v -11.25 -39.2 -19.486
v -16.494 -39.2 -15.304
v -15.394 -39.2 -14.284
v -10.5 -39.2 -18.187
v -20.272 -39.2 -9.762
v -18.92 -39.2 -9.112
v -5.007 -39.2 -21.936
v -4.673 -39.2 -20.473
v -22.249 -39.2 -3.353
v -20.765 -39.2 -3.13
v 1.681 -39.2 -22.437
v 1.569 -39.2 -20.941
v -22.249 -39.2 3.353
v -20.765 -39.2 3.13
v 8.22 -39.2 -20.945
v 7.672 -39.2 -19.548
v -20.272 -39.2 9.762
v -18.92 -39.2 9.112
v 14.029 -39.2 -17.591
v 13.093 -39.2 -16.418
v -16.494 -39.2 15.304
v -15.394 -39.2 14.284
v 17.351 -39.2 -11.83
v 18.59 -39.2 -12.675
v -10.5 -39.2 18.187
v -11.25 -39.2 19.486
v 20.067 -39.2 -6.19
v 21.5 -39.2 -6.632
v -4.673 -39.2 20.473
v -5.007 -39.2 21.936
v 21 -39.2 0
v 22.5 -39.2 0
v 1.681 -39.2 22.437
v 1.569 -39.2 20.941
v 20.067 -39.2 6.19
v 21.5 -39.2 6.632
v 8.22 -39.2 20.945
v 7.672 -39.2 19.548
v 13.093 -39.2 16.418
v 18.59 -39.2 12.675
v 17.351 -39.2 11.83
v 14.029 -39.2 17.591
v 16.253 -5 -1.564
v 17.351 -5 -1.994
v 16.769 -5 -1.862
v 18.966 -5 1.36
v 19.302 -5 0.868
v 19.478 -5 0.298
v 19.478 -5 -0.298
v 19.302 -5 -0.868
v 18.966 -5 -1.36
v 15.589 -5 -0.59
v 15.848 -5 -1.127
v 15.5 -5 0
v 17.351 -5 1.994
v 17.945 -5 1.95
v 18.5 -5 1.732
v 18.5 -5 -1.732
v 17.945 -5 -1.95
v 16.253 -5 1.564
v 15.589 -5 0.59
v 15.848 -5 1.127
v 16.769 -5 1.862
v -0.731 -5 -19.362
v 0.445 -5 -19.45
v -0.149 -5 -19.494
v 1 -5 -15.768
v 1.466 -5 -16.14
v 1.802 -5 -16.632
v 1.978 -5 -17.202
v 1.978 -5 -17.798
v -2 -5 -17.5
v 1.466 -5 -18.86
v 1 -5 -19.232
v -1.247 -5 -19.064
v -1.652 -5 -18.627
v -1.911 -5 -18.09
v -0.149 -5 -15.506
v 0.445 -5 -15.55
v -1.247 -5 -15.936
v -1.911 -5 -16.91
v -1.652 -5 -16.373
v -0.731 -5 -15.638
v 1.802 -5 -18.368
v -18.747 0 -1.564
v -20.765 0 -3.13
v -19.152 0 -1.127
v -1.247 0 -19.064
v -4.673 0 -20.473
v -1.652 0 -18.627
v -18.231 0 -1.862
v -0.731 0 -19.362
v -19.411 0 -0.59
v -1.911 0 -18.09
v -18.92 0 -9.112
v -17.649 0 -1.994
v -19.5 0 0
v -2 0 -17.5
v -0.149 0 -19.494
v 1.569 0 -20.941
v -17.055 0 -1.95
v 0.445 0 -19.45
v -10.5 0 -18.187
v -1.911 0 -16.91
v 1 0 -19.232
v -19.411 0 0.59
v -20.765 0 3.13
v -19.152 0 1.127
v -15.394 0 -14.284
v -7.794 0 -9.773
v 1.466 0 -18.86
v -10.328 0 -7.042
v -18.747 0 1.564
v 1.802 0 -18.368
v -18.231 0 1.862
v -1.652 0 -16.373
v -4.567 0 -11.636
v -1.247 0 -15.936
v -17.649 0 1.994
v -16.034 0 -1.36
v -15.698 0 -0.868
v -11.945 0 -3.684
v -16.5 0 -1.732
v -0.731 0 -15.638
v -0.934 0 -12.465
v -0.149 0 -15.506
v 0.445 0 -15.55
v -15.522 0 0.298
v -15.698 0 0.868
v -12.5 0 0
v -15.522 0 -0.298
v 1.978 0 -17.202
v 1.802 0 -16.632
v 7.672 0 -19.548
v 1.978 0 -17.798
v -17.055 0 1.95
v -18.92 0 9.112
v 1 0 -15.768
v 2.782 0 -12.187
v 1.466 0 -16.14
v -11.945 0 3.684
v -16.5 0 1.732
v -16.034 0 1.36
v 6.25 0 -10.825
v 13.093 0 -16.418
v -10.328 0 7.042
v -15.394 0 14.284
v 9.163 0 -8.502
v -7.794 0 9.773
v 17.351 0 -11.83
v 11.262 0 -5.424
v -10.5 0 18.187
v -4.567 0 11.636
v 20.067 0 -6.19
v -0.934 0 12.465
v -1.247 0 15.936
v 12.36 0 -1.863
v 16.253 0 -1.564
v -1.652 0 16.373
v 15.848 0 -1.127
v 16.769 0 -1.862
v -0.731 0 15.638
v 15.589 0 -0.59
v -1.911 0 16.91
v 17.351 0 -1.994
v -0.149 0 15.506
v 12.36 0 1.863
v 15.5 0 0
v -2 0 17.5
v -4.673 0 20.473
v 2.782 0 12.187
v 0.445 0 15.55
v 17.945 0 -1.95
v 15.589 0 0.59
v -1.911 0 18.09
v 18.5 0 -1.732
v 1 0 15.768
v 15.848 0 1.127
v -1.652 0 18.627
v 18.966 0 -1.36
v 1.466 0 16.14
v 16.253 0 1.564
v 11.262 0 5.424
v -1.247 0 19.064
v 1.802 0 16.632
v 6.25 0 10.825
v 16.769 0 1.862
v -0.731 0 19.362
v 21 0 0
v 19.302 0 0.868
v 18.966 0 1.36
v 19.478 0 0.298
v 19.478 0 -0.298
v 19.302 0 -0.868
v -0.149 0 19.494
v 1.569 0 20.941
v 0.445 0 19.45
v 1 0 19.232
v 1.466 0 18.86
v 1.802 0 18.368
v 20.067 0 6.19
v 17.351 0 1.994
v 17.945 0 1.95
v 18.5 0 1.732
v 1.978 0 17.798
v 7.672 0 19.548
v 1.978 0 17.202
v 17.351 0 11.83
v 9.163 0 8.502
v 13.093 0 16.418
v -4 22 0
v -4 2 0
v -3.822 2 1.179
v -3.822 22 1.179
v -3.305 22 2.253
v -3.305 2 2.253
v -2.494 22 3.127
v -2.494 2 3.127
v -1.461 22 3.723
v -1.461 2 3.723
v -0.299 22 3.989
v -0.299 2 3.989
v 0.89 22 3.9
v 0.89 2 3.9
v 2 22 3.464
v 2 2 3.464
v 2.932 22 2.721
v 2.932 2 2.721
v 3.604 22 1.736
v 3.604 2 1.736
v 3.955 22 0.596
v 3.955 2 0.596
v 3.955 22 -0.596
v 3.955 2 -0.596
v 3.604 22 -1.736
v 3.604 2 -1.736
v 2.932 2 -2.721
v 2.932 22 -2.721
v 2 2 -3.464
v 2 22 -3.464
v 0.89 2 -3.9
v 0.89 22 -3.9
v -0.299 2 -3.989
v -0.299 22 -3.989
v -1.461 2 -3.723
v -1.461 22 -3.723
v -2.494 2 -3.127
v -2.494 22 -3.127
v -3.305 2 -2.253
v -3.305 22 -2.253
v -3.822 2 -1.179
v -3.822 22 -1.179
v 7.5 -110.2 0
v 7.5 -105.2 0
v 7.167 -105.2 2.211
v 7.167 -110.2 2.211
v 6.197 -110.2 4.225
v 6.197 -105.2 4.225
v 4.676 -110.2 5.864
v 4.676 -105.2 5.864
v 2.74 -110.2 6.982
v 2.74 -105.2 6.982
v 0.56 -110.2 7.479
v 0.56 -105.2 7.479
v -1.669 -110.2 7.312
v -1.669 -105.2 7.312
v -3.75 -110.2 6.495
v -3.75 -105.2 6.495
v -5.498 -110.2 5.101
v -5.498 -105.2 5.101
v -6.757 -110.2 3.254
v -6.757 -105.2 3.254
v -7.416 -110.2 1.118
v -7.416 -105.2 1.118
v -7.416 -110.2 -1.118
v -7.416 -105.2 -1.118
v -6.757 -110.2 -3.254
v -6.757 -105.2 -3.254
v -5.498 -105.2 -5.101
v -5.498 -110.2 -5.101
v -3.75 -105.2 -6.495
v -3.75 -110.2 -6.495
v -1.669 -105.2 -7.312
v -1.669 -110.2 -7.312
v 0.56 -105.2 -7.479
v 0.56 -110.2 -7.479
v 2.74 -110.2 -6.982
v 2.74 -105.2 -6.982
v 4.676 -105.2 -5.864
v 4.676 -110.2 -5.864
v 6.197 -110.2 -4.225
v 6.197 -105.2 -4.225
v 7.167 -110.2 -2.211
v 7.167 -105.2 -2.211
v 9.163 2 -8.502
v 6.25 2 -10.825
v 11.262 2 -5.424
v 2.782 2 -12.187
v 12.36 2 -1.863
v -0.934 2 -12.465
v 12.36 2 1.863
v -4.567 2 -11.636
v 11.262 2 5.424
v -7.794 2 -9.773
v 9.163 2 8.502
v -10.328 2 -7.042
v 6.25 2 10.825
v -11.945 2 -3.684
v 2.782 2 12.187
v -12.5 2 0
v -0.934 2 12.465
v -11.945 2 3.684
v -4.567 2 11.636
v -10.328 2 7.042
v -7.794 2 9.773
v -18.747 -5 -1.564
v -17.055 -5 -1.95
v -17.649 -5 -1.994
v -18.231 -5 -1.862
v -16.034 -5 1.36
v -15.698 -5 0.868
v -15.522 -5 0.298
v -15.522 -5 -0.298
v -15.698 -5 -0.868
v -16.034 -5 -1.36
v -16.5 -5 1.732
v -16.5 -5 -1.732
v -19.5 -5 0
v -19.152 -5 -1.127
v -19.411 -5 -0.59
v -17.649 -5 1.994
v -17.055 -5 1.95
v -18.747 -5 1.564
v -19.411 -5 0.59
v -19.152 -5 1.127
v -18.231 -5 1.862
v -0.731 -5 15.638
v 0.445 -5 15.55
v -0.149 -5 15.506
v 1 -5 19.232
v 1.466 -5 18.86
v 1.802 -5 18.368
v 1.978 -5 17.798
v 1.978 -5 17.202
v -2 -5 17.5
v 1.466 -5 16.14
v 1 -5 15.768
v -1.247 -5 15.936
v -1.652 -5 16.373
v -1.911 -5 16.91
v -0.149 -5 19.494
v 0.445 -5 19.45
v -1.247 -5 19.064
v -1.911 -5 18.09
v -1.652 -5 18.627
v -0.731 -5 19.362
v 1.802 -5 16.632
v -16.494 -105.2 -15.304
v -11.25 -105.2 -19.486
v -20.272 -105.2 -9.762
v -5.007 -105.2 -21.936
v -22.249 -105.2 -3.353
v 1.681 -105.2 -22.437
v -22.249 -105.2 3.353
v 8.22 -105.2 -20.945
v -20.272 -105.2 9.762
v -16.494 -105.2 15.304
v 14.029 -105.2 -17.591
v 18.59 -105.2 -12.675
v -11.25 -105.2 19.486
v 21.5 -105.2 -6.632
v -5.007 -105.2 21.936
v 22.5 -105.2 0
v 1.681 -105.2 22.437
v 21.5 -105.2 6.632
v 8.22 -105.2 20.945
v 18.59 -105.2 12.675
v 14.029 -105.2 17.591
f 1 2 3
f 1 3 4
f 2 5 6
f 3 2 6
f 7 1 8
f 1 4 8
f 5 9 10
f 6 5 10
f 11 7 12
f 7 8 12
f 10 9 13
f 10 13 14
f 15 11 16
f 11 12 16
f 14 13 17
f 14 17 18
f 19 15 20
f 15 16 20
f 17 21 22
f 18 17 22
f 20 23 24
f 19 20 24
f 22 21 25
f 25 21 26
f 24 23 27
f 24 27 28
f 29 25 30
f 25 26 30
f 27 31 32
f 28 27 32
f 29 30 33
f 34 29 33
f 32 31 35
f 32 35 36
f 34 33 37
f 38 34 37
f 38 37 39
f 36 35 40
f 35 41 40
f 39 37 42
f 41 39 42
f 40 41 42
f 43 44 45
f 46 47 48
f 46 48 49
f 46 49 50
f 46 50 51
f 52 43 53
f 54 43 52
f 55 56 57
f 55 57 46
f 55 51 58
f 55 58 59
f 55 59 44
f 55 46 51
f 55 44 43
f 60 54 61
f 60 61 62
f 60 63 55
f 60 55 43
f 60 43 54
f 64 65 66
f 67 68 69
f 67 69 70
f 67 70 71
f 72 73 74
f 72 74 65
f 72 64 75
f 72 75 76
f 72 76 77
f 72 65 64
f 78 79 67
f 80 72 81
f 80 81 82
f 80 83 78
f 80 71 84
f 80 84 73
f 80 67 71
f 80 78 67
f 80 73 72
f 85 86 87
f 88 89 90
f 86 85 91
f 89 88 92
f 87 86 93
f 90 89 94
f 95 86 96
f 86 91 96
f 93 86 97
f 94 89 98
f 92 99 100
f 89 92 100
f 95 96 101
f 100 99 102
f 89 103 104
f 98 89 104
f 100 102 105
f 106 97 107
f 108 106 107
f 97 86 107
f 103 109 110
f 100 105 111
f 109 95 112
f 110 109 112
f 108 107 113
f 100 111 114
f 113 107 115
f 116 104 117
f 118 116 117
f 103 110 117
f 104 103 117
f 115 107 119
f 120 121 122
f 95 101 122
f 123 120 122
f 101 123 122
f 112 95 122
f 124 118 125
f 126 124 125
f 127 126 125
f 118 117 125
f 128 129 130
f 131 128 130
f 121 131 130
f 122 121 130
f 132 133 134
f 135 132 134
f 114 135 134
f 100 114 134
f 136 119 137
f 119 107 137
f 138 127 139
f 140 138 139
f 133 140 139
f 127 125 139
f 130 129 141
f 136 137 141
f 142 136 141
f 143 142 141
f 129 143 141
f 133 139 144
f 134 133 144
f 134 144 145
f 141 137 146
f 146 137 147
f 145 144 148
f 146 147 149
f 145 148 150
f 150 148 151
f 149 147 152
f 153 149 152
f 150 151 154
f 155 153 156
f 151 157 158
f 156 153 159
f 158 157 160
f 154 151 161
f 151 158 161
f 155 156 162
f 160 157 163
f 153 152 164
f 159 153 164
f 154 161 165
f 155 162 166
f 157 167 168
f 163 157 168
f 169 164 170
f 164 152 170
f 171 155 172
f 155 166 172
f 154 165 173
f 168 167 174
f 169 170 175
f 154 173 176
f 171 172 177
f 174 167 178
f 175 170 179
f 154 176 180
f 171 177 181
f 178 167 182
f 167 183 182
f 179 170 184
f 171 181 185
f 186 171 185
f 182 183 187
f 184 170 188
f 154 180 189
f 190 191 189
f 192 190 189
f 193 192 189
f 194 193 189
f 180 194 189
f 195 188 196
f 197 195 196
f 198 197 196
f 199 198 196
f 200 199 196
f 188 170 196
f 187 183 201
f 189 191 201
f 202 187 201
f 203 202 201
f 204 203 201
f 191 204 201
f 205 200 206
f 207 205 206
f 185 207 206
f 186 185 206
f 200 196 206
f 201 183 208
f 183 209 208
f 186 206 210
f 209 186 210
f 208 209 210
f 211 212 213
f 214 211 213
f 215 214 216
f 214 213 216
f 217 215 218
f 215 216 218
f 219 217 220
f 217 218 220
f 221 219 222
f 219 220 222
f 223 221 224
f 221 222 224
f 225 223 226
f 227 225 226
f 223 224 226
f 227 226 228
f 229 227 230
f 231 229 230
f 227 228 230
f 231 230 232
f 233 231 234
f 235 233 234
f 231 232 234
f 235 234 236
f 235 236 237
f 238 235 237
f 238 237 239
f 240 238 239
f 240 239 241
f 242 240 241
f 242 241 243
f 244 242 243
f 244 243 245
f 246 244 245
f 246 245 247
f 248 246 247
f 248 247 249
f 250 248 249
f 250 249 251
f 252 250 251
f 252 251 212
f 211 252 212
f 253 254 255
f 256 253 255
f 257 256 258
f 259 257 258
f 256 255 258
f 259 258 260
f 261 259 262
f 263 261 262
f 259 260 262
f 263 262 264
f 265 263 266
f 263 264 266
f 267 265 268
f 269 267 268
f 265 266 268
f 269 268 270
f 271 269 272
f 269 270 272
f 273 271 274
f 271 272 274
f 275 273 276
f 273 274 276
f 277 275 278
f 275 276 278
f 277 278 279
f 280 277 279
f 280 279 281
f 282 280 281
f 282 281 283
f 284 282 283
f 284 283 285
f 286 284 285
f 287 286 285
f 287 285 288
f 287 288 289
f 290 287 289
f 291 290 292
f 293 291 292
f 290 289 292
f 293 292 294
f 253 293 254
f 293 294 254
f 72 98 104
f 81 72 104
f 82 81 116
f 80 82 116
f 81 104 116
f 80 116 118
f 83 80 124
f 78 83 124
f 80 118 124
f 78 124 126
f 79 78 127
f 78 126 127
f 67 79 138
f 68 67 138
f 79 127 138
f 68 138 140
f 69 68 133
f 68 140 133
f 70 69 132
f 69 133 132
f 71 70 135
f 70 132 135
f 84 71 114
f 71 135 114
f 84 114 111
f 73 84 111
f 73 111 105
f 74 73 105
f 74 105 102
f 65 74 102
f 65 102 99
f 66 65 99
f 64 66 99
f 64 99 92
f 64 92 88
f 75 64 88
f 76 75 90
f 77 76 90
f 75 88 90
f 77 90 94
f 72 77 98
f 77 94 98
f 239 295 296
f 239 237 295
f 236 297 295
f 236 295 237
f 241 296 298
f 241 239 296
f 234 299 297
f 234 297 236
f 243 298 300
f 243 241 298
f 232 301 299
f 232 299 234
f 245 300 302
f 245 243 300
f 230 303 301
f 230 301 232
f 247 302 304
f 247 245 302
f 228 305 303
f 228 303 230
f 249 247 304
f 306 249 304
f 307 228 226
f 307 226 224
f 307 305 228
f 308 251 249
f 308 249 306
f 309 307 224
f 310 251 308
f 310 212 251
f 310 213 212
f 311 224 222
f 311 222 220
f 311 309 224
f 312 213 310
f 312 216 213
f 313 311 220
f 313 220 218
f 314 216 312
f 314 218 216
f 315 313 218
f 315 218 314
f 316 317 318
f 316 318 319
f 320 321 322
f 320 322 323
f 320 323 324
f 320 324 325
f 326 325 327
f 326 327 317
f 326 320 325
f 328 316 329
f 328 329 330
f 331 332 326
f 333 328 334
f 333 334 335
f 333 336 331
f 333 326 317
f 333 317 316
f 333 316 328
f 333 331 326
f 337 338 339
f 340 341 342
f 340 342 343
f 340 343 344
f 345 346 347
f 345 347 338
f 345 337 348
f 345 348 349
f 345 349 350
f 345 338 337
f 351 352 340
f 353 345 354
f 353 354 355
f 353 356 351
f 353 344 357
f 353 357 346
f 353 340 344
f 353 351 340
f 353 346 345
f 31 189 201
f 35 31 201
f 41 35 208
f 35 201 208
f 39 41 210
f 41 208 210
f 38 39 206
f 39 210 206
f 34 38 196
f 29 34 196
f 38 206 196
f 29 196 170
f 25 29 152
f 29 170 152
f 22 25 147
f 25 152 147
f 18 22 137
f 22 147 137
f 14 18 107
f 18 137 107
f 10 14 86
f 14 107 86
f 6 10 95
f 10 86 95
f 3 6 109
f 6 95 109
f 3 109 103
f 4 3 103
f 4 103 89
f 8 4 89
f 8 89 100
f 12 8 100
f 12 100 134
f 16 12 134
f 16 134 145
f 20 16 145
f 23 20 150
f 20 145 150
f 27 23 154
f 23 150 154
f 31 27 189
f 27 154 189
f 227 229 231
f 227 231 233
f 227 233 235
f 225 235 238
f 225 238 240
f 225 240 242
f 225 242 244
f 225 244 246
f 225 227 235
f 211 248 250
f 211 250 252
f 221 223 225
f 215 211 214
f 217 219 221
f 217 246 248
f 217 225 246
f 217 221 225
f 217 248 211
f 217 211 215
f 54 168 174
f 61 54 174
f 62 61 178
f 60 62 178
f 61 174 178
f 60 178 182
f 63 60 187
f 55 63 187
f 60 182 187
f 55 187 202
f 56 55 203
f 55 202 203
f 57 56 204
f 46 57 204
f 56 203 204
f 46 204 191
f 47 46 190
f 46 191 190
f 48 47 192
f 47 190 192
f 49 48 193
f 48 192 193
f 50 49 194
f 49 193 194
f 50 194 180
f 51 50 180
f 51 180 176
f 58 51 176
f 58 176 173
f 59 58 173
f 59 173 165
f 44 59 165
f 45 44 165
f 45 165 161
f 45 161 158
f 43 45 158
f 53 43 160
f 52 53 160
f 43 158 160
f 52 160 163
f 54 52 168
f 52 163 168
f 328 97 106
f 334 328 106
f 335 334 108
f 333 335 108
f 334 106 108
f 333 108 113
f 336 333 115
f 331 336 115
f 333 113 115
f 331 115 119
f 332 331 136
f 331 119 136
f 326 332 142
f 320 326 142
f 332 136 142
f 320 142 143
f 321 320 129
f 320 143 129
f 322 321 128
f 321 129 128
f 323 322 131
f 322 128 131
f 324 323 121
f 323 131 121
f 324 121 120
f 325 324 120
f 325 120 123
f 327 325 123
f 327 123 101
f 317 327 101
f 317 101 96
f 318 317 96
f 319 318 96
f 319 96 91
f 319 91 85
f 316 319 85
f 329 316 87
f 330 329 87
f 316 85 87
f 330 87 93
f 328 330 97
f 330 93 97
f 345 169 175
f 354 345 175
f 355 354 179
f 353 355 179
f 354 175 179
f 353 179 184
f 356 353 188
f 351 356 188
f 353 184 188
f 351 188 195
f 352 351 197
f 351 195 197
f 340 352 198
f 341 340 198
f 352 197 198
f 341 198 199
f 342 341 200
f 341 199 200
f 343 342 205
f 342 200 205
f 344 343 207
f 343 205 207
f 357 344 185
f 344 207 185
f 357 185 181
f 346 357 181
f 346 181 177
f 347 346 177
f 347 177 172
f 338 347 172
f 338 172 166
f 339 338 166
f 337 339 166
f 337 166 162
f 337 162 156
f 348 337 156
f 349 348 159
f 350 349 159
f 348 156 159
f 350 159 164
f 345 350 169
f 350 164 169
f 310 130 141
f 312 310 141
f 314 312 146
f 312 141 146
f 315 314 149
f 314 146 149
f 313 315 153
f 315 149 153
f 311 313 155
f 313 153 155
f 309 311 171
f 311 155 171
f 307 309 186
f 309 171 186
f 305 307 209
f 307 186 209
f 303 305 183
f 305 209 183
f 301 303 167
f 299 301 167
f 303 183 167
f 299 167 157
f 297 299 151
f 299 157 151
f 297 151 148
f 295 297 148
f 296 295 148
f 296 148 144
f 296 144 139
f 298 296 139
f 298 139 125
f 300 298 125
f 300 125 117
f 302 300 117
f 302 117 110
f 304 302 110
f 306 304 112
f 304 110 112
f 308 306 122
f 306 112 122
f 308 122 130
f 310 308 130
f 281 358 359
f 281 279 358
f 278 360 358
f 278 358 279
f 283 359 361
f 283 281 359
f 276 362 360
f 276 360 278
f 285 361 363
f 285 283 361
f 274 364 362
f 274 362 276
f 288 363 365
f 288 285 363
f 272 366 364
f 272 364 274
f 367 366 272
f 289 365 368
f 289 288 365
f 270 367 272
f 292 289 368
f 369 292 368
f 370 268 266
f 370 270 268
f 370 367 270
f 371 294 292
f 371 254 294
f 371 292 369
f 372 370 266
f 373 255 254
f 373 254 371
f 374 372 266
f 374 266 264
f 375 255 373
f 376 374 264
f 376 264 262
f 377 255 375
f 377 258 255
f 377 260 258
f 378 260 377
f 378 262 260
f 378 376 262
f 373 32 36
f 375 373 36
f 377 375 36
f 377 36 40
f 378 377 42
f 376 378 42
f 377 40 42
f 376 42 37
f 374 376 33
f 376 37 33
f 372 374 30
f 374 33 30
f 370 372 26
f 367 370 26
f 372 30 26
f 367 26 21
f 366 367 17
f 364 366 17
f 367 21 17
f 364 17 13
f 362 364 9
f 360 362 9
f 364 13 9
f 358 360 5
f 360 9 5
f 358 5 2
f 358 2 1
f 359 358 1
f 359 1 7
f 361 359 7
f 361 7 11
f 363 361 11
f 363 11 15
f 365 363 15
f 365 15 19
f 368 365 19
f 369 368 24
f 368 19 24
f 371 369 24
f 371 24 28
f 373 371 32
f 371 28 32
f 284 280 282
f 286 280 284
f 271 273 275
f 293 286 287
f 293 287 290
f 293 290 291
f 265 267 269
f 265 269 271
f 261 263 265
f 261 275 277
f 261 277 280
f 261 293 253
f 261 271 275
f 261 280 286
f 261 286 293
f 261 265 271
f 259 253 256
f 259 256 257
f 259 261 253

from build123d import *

# Parameters (mm, degrees)
F0_R      = 21
F1_DEPTH  = 39.2
F3_R      = 4
F4_DEPTH  = 22
F5_R      = 12.5
F6_DEPTH  = 2
F7_R      = 22.5
F8_DEPTH  = 66
F9_R      = 7.5
F10_DEPTH = 5
F11_R     = 2
F12_DEPTH = 5


with BuildPart() as f1:
    # F0 (on Front) → F1 (new body)
    with BuildSketch(Plane.XZ):
        Circle(F0_R)
    extrude(amount=F1_DEPTH)

    # F3 (on face) → F4 (join)
    with BuildSketch(Plane(origin=(0, 0, 0), x_dir=(-1, 0, 0), z_dir=(0, 1, 0))):
        Circle(F3_R)
    extrude(amount=F4_DEPTH)

    # F5 (on face) → F6 (join)
    with BuildSketch(Plane(origin=(0, 0, 0), x_dir=(-1, 0, 0), z_dir=(0, 1, 0))):
        Circle(F5_R)
    extrude(amount=F6_DEPTH)

    # F7 (on face) → F8 (join)
    with BuildSketch(Plane.XZ.offset(39.2)):
        Circle(F7_R)
    extrude(amount=F8_DEPTH)

    # F9 (on face) → F10 (join)
    with BuildSketch(Plane.XZ.offset(105.2)):
        Circle(F9_R)
    extrude(amount=F10_DEPTH)

    # F11 (on face) → F12 (cut)
    with BuildSketch(Plane(origin=(0, 0, 0), x_dir=(-1, 0, 0), z_dir=(0, 1, 0))):
        with Locations((-17.5, 0)):
            Circle(F11_R)
        with Locations((0, 17.5)):
            Circle(F11_R)
        with Locations((17.5, 0)):
            Circle(F11_R)
        with Locations((0, -17.5)):
            Circle(F11_R)
    extrude(amount=-F12_DEPTH, mode=Mode.SUBTRACT)


solid = f1.part
